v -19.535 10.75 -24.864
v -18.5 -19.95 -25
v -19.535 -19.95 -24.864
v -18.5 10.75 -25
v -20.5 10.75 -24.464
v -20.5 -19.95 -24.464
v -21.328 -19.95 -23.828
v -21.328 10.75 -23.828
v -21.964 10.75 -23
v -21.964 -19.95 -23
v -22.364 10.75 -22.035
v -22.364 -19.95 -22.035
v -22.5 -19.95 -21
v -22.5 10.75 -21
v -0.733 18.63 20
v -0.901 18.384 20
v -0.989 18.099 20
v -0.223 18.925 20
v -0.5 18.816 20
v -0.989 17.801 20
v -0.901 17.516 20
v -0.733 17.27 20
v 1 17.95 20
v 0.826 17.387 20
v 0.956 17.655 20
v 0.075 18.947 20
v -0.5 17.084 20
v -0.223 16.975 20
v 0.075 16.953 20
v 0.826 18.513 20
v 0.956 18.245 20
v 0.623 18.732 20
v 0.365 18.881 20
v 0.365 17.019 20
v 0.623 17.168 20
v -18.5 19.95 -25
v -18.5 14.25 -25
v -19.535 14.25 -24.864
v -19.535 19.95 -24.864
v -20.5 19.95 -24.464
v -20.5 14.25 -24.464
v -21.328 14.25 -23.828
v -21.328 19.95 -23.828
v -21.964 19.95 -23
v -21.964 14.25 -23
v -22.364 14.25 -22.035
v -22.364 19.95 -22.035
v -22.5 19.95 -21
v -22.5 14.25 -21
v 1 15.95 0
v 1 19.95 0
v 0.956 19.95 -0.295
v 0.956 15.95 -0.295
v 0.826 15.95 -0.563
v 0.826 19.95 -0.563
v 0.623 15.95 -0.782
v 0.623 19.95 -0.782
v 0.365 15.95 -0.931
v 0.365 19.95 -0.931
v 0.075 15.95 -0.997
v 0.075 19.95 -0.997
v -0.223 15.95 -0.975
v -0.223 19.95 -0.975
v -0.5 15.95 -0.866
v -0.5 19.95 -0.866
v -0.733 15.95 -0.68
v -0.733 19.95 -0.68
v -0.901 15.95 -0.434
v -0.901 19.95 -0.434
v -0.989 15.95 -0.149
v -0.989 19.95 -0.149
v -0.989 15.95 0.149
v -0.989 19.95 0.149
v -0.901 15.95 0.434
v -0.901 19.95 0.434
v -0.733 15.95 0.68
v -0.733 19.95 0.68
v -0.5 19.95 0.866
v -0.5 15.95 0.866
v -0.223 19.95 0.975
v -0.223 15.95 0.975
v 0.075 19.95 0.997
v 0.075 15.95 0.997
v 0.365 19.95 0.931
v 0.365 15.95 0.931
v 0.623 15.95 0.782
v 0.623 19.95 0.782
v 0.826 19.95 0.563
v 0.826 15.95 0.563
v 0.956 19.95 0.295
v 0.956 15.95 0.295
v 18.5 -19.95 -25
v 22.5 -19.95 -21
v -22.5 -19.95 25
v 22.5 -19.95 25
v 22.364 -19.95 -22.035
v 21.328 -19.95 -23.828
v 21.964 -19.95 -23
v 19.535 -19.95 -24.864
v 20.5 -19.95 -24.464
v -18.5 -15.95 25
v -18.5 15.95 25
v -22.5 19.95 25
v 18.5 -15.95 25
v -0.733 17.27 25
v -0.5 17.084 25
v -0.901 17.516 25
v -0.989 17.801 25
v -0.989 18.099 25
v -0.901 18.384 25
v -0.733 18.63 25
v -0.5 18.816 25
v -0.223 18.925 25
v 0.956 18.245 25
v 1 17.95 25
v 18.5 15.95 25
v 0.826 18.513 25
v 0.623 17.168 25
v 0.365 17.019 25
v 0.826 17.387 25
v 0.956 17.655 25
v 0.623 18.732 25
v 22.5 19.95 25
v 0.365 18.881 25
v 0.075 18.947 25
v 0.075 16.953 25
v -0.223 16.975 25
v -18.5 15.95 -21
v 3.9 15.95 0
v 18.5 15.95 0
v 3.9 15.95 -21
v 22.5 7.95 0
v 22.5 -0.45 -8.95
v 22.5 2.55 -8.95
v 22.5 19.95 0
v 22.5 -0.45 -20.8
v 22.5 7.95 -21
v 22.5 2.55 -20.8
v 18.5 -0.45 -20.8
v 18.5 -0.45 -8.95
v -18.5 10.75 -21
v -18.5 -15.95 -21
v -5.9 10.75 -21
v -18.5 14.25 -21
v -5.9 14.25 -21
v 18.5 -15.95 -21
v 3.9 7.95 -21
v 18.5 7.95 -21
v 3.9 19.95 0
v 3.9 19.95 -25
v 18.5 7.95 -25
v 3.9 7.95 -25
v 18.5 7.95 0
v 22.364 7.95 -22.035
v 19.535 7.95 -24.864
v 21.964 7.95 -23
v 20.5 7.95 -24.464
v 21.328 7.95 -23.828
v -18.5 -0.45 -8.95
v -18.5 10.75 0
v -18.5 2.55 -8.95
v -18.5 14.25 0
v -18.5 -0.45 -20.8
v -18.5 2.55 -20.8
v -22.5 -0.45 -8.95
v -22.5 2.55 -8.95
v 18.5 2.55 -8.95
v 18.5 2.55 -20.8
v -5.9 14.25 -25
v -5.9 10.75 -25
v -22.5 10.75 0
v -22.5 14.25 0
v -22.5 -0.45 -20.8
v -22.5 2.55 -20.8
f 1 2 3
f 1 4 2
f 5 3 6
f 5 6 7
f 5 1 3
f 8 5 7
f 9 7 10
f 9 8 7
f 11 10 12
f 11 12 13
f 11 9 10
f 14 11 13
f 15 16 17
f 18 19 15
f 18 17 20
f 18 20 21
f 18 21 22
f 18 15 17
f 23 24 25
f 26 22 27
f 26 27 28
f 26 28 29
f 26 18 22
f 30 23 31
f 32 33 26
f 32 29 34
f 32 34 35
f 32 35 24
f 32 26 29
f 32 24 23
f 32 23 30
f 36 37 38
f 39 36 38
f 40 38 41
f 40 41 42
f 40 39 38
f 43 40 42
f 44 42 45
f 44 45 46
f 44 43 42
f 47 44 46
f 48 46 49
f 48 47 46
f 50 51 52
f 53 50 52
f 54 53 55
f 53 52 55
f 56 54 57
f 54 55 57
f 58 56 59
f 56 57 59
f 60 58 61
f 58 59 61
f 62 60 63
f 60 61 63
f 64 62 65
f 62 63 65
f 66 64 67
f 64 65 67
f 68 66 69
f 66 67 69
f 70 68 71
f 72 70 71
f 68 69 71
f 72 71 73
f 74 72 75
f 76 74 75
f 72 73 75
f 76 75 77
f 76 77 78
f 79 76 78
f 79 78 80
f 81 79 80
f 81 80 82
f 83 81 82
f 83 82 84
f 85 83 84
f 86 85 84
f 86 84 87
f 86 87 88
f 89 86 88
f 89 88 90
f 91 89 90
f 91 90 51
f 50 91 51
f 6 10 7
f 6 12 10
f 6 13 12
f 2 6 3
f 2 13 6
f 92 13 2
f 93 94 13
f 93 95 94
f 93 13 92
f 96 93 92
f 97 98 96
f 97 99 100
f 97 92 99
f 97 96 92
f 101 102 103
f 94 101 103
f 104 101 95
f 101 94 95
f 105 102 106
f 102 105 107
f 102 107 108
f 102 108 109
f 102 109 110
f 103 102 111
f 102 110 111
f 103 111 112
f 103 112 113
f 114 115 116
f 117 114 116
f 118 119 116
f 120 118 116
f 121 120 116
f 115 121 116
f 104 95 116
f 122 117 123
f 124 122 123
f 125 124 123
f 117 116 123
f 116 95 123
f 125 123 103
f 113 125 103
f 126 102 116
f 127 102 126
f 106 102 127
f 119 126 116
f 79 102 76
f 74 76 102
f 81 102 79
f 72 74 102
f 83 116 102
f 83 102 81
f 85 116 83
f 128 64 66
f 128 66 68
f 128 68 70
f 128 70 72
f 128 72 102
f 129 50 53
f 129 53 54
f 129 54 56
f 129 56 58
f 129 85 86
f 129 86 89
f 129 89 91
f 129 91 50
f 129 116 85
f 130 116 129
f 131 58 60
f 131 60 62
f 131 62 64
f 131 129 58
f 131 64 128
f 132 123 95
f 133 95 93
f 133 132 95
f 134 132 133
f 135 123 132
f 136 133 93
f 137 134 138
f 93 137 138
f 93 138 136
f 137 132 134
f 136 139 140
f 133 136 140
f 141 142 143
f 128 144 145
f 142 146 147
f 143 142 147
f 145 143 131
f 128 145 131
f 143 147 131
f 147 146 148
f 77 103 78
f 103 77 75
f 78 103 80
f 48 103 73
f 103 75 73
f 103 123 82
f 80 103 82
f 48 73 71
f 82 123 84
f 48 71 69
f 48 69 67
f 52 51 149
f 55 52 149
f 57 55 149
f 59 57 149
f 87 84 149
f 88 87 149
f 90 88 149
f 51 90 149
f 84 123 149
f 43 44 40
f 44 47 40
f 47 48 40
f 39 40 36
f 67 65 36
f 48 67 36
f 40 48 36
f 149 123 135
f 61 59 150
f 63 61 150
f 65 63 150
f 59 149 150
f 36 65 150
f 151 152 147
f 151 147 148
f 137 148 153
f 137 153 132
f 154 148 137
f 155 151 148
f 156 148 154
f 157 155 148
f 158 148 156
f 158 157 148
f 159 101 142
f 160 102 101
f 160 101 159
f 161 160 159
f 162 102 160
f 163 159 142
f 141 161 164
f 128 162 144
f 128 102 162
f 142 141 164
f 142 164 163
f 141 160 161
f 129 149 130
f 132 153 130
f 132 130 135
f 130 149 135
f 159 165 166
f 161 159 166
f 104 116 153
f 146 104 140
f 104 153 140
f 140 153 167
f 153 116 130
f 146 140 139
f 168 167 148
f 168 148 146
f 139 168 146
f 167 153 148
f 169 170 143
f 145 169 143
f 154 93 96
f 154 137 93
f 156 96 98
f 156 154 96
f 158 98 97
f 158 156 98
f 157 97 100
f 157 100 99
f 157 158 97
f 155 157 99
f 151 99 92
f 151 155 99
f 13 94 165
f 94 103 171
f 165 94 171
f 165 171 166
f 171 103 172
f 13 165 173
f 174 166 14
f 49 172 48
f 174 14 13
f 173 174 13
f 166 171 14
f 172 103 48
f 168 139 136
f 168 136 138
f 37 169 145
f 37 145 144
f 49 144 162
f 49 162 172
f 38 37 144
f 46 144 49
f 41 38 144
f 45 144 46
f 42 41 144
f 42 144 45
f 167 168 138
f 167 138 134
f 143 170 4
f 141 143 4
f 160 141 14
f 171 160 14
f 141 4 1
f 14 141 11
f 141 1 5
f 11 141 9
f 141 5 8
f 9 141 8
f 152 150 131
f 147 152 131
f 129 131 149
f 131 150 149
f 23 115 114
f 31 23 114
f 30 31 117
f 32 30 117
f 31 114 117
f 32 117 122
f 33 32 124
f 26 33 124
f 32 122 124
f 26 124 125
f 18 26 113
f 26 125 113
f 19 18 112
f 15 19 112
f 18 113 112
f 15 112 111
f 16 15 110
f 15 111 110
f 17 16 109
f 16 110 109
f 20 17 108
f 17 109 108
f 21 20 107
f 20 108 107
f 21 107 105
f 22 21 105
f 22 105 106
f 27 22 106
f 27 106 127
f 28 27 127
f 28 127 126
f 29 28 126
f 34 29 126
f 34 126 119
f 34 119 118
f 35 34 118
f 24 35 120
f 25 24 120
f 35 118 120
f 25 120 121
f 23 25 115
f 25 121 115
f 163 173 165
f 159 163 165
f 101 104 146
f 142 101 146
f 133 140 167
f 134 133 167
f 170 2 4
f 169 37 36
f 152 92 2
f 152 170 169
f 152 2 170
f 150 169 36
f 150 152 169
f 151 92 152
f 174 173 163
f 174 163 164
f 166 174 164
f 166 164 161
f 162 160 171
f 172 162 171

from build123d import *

# Parameters (mm, degrees)
CROQUIS1_W                        = 50
CROQUIS1_H                        = 39.9
SALIENTE_EXTRUIR1_DEPTH           = 22.5
VACIADO1_T                        = -4
CORTAR_EXTRUIR1_START             = -9.2
CORTAR_EXTRUIR1_DEPTH             = 3.5
CORTAR_EXTRUIR3_REACH             = 41.9
CROQUIS4_R                        = 1
CORTAR_EXTRUIR3_DIRECTION_2_DEPTH = 1
CROQUIS5_R                        = 1
CORTAR_EXTRUIR4_DEPTH             = 5
CORTAR_EXTRUIR5_DEPTH             = 12
CROQUIS8_W                        = 11.85
CROQUIS8_H                        = 3
CORTAR_EXTRUIR6_DEPTH             = 1
CORTAR_EXTRUIR6_DEPTH_BACK        = 46
REDONDEO1_R                       = 4


with BuildPart() as part:
    # Croquis1 → Saliente-Extruir1 (new body, symmetric)
    with BuildSketch(Plane(origin=(0, 0, 0), x_dir=(0, 0, -1), z_dir=(1, 0, 0))):
        Rectangle(CROQUIS1_W, CROQUIS1_H)
    extrude(amount=SALIENTE_EXTRUIR1_DEPTH, both=True)

    # Vaciado1
    vaciado1_openings = [part.faces().sort_by_distance(p)[0] for p in [
        (0, 0, 25),
    ]]
    offset(amount=VACIADO1_T, openings=vaciado1_openings, kind=Kind.INTERSECTION)

    # Croquis2 → Cortar-Extruir1 (cut)
    with BuildSketch(Plane(origin=(0, 19.95, 0), x_dir=(1, 0, 0), z_dir=(0, 1, 0)).offset(CORTAR_EXTRUIR1_START)):
        Polygon((-22.5, 25), (-5.9, 25), (-5.9, 21), (-18.5, 21), (-18.5, 0), (-22.5, 0), align=None)
        Polygon((18.5, 0), (22.5, 0), (22.5, 25), (5.9, 25), (5.9, 21), (18.5, 21), align=None)
    extrude(amount=CORTAR_EXTRUIR1_DEPTH, mode=Mode.SUBTRACT)

    # Croquis4 → Cortar-Extruir3 (cut, up to next)
    with BuildSketch(Plane(origin=(0, 19.95, 0), x_dir=(1, 0, 0), z_dir=(0, 1, 0)), mode=Mode.PRIVATE) as cortar_extruir3_sk1:
        Circle(CROQUIS4_R)
    cortar_extruir3_tool1 = extrude(cortar_extruir3_sk1.sketch, amount=-CORTAR_EXTRUIR3_REACH, mode=Mode.PRIVATE) & part.part
    add(cortar_extruir3_tool1.solids().sort_by_distance((0, 19.95, 0))[0], mode=Mode.SUBTRACT)

    # Croquis4 → Cortar-Extruir3 direction 2 (cut)
    with BuildSketch(Plane(origin=(0, 19.95, 0), x_dir=(1, 0, 0), z_dir=(0, 1, 0))):
        Circle(CROQUIS4_R)
    extrude(amount=CORTAR_EXTRUIR3_DIRECTION_2_DEPTH, mode=Mode.SUBTRACT)

    # Croquis5 → Cortar-Extruir4 (cut)
    with BuildSketch(Plane.XY.offset(25)):
        with Locations((0, 17.95)):
            Circle(CROQUIS5_R)
    extrude(amount=-CORTAR_EXTRUIR4_DEPTH, mode=Mode.SUBTRACT)

    # Croquis7 → Cortar-Extruir5 (cut)
    with BuildSketch(Plane(origin=(0, 19.95, 0), x_dir=(1, 0, 0), z_dir=(0, 1, 0))):
        Polygon((5.9, 0), (18.5, 0), (22.5, 0), (22.5, 25), (5.9, 25), (3.9, 25), (3.9, 0), align=None)
    extrude(amount=-CORTAR_EXTRUIR5_DEPTH, mode=Mode.SUBTRACT)

    # Croquis8 → Cortar-Extruir6 (cut, two sides)
    with BuildSketch(Plane.ZY.offset(22.5)) as cortar_extruir6_sk:
        with Locations((-14.875, 1.05)):
            Rectangle(CROQUIS8_W, CROQUIS8_H)
    extrude(amount=CORTAR_EXTRUIR6_DEPTH, mode=Mode.SUBTRACT)
    extrude(cortar_extruir6_sk.sketch, amount=-CORTAR_EXTRUIR6_DEPTH_BACK, mode=Mode.SUBTRACT)

    # Redondeo1
    redondeo1_edges = [part.edges().sort_by_distance(p)[0] for p in [
        (-22.5, 17.1, -25),
        (22.5, -6, -25),
        (-22.5, -4.6, -25),
    ]]
    fillet(redondeo1_edges, radius=REDONDEO1_R)


solid = part.part
